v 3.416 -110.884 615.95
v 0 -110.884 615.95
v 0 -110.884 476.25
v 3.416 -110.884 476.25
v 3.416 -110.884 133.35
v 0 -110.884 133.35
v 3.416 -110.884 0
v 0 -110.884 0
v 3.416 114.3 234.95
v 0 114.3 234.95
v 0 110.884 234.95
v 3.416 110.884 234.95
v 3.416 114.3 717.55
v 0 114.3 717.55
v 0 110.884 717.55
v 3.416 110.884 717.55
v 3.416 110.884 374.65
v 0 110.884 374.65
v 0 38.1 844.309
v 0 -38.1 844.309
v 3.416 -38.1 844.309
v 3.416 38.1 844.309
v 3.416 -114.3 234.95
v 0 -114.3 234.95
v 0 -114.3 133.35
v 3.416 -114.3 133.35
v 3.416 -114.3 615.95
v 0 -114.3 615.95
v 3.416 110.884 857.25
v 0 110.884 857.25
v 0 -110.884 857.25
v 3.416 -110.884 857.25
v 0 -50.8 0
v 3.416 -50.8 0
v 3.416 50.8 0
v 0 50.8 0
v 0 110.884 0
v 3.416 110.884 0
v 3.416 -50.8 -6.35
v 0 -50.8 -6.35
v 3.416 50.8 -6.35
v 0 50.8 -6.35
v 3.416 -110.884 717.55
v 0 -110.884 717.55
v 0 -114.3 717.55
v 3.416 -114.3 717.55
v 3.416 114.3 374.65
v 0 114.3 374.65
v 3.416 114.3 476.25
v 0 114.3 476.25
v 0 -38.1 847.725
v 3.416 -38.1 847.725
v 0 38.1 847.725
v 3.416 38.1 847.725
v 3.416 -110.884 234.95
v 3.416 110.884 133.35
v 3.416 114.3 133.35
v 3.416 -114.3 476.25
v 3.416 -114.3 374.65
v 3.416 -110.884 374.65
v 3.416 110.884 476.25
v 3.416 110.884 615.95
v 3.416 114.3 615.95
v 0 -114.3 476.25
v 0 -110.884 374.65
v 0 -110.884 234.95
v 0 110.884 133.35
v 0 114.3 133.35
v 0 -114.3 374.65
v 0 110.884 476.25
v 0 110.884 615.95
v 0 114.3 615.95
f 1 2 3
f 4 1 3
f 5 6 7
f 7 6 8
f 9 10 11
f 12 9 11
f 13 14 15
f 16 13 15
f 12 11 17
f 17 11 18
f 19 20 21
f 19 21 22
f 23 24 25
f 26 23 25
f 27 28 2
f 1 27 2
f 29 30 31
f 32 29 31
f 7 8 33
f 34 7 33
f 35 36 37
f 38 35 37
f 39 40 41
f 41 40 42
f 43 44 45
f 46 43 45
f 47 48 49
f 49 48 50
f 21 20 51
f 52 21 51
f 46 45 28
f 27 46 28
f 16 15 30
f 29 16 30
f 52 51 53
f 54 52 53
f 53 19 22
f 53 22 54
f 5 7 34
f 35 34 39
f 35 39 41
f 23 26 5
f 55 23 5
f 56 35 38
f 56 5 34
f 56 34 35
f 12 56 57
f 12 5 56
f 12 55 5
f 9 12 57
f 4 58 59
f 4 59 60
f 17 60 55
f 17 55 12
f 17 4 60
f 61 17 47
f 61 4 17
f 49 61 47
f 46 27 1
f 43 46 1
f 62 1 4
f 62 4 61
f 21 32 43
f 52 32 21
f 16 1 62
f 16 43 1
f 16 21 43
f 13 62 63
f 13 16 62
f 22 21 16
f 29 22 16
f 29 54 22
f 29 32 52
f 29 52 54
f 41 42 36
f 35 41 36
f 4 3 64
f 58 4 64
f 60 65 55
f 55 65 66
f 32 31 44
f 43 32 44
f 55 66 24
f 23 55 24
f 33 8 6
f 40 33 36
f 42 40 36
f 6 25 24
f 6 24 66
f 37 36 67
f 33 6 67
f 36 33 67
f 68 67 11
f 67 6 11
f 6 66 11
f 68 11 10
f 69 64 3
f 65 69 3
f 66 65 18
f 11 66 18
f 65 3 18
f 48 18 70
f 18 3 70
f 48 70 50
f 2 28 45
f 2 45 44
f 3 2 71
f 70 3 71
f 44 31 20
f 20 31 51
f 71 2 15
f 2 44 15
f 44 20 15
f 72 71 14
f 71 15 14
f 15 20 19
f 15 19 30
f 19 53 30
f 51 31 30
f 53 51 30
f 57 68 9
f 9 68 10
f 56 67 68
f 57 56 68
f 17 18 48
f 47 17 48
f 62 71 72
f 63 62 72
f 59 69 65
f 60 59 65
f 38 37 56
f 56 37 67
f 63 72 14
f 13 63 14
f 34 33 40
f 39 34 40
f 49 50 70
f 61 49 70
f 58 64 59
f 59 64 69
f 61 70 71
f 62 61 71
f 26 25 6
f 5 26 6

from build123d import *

# Parameters (mm, degrees)
F0_W     = 76.2
F0_H     = 3.4163
F1_DEPTH = 3.4163


with BuildPart() as f1:
    # F0 (on Right) → F1 (new body)
    with BuildSketch(Plane.YZ):
        Polygon((-50.8, 0), (-50.8, -6.35), (50.8, -6.35), (50.8, 0), (110.8837, 0), (110.8837, 133.35), (114.3, 133.35), (114.3, 234.95), (110.8837, 234.95), (110.8837, 374.65), (114.3, 374.65), (114.3, 476.25), (110.8837, 476.25), (110.8837, 615.95), (114.3, 615.95), (114.3, 717.55), (110.8837, 717.55), (110.8837, 857.25), (38.1, 857.25), (-38.1, 857.25), (-110.8837, 857.25), (-110.8837, 717.55), (-114.3, 717.55), (-114.3, 615.95), (-110.8837, 615.95), (-110.8837, 476.25), (-114.3, 476.25), (-114.3, 374.65), (-110.8837, 374.65), (-110.8837, 234.95), (-114.3, 234.95), (-114.3, 133.35), (-110.8837, 133.35), (-110.8837, 0), align=None)
        with Locations((0, 846.01685)):
            Rectangle(F0_W, F0_H, mode=Mode.SUBTRACT)
    extrude(amount=F1_DEPTH)


solid = f1.part
